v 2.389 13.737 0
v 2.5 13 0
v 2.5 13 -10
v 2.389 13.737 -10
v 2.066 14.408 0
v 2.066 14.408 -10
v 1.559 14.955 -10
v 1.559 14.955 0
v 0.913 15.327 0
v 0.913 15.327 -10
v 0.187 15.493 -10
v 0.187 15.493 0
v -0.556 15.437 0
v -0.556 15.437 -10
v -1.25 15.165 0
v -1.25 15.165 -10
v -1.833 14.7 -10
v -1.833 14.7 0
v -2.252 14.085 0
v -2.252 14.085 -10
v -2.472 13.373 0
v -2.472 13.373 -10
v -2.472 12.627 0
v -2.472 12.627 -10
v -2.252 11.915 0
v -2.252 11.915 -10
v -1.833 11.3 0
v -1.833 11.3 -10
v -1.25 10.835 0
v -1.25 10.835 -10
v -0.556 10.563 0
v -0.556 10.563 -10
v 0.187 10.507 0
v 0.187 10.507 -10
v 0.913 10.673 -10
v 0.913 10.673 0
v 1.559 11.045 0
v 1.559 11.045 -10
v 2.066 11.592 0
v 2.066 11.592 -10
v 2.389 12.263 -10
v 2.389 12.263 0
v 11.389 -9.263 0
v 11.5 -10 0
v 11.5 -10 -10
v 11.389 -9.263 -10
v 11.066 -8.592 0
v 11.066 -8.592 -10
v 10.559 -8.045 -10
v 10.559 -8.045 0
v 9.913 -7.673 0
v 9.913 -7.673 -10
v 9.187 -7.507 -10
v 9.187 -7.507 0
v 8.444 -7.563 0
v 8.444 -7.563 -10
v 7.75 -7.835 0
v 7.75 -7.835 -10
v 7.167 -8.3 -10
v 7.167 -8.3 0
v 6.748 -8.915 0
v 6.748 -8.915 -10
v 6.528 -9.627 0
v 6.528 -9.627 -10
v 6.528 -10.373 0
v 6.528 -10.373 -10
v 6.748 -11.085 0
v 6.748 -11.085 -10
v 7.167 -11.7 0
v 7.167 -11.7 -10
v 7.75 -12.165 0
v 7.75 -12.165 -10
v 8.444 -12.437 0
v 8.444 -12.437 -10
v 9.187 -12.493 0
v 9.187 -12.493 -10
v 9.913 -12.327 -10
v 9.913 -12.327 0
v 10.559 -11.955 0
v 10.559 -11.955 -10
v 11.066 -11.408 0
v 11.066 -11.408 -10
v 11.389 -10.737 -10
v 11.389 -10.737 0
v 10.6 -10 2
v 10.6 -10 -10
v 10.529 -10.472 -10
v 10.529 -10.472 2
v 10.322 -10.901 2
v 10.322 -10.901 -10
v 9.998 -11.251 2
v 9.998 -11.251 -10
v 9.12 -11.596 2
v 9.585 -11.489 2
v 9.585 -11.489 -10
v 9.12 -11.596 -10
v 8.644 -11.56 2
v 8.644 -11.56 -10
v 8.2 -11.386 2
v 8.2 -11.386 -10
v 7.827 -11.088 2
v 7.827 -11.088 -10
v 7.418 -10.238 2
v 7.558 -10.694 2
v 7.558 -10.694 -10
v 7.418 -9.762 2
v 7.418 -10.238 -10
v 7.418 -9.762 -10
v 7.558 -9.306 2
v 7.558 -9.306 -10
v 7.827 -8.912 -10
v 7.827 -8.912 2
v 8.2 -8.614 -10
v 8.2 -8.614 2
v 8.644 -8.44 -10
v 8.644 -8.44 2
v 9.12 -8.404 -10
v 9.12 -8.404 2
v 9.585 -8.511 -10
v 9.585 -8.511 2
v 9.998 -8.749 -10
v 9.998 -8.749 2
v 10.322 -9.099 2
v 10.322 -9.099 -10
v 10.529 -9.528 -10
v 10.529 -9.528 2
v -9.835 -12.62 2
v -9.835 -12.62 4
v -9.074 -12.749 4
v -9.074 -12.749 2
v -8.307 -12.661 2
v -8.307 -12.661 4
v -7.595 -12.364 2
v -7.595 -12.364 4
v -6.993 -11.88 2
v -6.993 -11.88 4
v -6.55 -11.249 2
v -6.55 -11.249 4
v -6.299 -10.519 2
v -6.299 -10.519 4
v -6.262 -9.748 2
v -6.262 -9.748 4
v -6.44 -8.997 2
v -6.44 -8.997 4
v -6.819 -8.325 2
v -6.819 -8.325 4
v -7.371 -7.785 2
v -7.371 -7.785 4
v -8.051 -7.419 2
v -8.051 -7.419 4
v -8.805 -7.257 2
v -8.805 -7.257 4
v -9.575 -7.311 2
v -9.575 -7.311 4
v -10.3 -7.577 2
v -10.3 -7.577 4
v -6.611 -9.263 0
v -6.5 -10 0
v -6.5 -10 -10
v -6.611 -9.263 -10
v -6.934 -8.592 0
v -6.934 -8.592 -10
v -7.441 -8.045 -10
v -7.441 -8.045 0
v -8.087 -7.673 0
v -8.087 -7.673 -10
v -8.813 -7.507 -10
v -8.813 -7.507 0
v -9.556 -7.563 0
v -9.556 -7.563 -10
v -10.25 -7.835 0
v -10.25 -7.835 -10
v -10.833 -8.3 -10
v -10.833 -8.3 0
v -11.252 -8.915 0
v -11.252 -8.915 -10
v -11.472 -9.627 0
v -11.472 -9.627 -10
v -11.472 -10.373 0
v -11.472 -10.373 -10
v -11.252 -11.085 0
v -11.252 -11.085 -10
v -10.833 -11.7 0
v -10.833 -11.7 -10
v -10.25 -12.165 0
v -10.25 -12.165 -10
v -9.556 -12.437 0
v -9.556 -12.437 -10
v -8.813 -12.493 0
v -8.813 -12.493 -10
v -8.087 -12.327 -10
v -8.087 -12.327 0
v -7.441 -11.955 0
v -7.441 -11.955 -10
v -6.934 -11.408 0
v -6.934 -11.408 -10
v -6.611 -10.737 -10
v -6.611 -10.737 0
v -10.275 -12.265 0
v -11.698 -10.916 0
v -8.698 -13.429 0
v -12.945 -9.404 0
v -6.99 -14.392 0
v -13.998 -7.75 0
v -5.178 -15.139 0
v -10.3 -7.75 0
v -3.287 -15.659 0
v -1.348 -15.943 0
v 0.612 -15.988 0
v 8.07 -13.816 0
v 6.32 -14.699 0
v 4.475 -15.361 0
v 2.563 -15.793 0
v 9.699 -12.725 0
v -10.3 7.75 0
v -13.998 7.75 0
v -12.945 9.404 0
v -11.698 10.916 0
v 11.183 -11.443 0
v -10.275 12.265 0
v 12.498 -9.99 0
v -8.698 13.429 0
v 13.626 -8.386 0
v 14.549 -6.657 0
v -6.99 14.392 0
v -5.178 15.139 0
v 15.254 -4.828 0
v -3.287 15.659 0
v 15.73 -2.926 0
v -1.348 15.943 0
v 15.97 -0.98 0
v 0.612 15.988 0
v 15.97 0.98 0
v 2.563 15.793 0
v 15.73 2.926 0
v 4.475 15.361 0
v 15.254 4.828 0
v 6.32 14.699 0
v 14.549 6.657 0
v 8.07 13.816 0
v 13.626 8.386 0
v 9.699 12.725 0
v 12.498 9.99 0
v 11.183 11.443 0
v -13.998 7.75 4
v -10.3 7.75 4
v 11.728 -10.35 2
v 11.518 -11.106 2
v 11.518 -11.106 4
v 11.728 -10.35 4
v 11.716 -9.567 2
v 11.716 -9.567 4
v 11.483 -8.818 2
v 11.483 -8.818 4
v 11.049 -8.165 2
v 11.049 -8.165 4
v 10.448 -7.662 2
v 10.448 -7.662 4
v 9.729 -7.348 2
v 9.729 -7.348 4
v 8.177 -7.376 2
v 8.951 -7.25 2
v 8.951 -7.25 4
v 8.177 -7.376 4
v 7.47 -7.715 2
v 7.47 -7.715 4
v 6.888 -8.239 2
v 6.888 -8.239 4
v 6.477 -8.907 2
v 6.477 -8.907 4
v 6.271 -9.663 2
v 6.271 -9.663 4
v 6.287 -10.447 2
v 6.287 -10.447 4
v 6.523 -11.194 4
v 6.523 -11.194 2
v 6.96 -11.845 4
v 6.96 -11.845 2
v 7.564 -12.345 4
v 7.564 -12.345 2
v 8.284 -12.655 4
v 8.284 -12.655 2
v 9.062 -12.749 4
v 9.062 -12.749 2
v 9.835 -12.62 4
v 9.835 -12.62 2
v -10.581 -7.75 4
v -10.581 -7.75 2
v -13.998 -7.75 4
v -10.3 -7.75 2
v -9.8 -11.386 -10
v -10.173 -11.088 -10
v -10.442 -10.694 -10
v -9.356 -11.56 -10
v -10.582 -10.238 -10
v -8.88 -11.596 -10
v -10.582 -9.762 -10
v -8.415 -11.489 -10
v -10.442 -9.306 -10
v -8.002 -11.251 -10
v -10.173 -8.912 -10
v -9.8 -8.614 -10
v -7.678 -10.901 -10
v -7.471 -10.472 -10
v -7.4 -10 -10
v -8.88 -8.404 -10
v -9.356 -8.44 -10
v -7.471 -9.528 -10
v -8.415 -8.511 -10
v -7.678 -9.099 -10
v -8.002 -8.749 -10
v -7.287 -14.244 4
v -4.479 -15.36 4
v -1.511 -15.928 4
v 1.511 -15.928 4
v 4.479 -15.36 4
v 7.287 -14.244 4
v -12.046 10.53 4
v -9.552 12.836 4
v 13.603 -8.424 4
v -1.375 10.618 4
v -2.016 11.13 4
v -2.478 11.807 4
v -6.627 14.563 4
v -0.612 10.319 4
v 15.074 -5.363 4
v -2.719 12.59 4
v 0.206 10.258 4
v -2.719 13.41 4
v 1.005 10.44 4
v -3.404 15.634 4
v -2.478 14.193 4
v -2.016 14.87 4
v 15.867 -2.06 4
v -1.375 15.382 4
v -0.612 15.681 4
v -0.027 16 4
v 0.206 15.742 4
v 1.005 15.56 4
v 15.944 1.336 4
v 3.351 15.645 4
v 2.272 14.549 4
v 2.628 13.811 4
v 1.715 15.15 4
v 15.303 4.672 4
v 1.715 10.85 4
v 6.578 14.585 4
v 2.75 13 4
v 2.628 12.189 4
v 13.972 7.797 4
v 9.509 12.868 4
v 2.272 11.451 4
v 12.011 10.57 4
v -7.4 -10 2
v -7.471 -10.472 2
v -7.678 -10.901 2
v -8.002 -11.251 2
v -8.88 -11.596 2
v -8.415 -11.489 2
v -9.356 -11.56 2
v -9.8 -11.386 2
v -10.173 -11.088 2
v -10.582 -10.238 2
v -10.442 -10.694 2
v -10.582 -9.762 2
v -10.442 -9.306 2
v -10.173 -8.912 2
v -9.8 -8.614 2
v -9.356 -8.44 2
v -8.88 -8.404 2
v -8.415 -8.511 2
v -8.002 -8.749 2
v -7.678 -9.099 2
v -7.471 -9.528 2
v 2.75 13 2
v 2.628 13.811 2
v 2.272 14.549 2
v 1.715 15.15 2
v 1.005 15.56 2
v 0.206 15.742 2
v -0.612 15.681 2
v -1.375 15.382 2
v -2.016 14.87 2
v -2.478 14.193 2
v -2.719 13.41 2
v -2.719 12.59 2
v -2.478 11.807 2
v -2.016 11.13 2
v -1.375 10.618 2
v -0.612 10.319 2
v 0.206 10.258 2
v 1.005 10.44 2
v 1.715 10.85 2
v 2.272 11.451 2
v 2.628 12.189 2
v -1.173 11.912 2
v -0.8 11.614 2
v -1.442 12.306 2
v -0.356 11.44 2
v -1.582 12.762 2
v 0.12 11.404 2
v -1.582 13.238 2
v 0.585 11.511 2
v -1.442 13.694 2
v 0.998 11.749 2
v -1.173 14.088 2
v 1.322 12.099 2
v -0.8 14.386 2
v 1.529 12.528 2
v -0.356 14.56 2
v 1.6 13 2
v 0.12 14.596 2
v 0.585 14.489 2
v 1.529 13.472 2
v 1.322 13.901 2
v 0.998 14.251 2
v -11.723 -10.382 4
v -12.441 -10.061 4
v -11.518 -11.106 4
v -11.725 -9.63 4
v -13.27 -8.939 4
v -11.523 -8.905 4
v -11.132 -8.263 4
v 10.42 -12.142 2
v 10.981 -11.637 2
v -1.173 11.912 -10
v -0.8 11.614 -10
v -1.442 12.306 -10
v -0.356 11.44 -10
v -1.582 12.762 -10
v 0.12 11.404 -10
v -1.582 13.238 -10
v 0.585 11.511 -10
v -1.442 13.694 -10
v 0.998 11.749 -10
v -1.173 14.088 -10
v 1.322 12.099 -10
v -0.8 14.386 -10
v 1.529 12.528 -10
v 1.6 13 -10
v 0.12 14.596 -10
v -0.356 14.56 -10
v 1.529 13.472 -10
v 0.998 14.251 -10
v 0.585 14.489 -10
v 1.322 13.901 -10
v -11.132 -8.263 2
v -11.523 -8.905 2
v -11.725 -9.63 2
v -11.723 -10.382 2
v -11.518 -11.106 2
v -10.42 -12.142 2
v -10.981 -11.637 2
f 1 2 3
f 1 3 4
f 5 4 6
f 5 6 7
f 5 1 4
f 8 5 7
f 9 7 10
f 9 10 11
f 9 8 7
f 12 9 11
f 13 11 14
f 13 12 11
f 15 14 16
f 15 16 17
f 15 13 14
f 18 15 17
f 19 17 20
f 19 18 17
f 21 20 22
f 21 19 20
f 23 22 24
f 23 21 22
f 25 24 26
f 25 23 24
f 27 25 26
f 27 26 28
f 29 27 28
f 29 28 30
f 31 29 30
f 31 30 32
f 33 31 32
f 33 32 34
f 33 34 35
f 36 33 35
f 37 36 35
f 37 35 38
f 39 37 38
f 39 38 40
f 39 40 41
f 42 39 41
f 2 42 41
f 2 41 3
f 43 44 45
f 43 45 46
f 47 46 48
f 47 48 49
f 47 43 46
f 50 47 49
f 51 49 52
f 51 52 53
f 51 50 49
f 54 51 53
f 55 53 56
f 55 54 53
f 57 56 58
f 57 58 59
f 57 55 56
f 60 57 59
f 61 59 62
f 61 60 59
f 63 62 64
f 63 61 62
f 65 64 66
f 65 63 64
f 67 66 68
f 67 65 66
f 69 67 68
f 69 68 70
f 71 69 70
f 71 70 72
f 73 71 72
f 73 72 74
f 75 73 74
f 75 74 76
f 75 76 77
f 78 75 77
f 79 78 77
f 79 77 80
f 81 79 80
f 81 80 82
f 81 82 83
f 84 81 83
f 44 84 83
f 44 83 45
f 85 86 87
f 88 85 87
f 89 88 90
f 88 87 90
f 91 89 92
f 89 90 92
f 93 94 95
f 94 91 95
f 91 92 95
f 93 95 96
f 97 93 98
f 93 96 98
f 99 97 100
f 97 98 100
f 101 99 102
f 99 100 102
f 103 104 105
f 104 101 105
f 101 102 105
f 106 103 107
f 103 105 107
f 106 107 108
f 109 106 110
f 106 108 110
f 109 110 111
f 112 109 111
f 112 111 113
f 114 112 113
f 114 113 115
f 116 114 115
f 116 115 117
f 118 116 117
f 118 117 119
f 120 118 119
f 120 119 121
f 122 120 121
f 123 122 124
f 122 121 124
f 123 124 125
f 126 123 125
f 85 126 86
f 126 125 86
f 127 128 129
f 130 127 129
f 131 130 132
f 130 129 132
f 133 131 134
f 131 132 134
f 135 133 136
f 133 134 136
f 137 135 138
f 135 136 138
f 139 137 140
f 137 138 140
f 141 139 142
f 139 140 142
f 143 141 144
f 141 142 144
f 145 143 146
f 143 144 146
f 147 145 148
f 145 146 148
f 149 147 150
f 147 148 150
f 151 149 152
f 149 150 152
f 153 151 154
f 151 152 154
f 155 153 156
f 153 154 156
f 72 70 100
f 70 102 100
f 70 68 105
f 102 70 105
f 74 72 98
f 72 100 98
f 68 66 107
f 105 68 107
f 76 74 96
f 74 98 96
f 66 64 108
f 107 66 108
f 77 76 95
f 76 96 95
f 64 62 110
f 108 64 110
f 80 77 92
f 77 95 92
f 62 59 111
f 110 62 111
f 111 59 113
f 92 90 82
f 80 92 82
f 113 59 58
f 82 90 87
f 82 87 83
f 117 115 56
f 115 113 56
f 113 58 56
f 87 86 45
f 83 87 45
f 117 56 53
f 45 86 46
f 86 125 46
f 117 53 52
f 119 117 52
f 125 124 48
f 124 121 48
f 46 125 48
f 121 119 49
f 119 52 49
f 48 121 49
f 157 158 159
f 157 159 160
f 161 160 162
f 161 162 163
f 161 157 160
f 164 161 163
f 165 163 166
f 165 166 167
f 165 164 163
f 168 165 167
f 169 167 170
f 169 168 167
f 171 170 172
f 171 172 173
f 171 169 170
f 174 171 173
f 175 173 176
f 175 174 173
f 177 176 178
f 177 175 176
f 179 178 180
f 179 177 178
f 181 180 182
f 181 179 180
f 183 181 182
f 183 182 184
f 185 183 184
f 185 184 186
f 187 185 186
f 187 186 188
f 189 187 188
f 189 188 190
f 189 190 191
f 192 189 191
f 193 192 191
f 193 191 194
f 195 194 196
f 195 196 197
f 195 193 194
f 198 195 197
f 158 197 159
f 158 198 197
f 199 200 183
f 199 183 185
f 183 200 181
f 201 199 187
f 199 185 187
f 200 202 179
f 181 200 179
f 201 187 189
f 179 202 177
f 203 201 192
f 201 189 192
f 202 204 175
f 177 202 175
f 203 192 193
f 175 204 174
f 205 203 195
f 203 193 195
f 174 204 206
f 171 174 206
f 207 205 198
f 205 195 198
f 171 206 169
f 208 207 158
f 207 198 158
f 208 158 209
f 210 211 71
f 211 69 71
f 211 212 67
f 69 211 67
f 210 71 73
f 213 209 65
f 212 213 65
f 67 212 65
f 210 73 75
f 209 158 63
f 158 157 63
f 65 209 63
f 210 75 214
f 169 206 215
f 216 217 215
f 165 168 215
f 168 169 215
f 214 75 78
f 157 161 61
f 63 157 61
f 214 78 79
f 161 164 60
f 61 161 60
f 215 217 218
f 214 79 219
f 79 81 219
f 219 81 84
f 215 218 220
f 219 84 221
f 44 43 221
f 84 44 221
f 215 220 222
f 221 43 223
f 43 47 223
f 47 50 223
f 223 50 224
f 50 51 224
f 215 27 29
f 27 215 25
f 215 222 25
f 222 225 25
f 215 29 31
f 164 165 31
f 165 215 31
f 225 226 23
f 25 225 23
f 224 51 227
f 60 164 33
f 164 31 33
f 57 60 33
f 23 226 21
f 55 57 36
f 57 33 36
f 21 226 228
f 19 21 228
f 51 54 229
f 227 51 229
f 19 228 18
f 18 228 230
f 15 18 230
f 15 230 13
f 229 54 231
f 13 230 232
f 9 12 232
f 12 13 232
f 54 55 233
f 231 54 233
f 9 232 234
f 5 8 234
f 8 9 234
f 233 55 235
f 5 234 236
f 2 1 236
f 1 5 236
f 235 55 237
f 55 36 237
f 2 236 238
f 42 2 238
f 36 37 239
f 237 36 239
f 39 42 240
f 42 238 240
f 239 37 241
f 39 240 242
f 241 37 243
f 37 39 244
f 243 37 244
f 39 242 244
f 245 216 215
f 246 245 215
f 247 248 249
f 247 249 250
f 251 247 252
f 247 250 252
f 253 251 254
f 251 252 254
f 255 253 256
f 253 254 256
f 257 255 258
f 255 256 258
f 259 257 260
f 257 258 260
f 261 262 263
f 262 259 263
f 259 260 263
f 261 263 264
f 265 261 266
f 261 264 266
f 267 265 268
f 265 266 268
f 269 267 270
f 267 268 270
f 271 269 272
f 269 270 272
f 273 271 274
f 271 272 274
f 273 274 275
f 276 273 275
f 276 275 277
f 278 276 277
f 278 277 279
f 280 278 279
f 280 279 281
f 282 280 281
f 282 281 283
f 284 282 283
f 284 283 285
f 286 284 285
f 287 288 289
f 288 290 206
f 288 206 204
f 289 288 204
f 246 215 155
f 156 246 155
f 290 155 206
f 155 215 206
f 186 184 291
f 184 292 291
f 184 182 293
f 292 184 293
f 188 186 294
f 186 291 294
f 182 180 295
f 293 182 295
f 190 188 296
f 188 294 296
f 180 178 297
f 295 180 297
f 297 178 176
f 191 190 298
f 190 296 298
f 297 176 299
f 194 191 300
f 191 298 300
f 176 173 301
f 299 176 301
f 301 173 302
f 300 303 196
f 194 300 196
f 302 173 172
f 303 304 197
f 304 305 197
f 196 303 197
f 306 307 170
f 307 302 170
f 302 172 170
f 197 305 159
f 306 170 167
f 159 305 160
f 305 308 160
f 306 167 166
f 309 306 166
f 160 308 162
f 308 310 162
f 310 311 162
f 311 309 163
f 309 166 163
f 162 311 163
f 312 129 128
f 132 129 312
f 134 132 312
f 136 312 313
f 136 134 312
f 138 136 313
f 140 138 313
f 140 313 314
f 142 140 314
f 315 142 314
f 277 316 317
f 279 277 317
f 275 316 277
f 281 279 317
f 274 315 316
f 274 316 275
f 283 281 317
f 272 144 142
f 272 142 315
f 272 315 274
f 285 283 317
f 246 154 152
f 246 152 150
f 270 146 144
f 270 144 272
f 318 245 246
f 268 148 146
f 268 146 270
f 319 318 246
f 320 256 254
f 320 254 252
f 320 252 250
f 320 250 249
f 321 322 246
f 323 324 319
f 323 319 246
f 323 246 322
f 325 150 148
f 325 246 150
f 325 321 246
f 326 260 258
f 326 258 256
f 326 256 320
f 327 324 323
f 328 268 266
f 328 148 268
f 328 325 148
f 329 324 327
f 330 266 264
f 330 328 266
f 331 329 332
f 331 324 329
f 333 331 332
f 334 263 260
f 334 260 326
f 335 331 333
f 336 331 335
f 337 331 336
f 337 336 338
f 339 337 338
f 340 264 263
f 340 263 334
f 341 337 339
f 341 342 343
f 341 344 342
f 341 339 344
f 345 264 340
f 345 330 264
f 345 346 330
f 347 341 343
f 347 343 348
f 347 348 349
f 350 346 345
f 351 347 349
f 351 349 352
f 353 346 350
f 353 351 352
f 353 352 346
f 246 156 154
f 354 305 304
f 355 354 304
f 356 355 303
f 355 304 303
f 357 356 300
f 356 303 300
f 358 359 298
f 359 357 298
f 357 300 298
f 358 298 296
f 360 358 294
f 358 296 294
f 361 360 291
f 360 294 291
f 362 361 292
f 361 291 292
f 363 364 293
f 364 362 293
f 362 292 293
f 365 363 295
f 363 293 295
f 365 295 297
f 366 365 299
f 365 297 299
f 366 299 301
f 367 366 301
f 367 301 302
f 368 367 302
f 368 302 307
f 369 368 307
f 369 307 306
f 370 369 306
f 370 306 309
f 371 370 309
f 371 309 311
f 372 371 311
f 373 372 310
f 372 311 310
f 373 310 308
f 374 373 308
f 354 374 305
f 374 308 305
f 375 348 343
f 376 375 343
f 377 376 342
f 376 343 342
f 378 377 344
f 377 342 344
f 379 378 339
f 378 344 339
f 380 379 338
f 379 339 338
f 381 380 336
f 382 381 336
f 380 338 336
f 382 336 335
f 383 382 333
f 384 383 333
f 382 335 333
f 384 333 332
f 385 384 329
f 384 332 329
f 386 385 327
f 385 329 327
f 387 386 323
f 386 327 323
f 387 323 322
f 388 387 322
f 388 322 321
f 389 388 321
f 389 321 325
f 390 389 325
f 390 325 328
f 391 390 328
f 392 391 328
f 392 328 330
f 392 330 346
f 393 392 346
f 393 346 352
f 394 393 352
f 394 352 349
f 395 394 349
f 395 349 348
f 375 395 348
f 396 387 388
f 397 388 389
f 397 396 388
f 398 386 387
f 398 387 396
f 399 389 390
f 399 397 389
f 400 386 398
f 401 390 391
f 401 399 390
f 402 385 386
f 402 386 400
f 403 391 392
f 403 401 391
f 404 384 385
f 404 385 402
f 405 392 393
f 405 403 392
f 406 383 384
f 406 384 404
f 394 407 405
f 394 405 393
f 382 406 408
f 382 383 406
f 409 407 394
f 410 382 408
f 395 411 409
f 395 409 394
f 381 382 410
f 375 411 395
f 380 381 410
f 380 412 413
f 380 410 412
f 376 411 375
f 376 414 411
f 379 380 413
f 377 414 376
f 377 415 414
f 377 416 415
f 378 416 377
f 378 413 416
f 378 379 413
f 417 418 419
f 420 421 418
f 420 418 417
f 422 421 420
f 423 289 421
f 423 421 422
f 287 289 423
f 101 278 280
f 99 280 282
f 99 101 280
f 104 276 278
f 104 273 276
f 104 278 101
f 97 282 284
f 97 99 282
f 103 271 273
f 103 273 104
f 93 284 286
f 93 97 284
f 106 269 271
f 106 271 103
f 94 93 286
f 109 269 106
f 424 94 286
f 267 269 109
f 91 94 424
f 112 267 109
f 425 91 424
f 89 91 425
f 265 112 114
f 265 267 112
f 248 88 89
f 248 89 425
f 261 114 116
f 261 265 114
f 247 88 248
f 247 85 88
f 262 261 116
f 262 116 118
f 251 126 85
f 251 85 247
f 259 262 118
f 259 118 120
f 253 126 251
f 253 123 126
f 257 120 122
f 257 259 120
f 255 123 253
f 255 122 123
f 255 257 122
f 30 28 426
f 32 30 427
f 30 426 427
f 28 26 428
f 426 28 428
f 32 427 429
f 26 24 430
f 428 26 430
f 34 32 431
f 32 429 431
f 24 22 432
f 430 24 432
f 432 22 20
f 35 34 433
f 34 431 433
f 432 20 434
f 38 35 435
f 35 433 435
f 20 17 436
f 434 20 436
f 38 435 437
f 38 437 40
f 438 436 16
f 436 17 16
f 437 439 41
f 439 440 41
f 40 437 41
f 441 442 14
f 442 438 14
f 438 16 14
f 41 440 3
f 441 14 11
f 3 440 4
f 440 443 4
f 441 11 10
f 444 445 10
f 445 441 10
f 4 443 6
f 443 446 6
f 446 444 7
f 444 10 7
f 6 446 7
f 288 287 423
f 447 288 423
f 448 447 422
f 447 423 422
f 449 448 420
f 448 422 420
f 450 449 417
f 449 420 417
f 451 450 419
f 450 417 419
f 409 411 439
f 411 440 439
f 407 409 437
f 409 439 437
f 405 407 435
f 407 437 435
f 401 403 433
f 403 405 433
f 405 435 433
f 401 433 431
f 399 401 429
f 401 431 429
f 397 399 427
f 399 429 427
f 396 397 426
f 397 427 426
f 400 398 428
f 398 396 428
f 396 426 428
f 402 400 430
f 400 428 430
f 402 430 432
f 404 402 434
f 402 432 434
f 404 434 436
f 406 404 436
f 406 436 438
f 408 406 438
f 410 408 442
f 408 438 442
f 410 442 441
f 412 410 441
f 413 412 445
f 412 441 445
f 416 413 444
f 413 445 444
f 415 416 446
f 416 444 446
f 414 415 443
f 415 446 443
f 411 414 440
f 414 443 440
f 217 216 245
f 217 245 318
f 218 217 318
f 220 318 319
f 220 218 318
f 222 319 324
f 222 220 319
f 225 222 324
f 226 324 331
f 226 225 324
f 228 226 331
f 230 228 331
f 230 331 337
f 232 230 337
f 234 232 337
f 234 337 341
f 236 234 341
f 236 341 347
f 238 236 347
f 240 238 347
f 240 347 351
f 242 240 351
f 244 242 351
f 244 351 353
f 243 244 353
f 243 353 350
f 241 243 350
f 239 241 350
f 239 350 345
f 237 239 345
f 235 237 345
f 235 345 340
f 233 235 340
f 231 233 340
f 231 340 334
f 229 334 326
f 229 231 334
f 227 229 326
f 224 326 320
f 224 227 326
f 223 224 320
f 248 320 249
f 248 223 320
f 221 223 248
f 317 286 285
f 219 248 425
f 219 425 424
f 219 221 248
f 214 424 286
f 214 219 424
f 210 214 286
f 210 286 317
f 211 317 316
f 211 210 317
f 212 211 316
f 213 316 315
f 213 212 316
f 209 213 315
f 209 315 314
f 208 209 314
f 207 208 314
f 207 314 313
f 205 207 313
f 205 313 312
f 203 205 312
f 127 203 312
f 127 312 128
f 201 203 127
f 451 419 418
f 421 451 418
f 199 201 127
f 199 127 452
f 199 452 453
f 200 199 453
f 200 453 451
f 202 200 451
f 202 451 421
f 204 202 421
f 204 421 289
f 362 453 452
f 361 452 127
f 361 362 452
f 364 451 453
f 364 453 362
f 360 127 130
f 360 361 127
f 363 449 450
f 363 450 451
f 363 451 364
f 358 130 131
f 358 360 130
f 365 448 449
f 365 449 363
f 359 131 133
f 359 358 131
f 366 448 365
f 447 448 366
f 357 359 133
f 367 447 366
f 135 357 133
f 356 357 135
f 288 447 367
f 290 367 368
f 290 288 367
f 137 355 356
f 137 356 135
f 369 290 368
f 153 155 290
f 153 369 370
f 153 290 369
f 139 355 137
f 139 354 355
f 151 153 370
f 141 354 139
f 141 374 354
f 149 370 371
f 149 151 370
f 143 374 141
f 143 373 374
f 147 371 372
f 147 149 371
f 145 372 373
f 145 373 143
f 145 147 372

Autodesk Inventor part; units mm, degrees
ref_plane "YZ Plane" through (0, 0, 0) normal (1, 0, 0) x (0, 1, 0)
ref_plane "XZ Plane" through (0, 0, 0) normal (0, 1, 0) x (-1, 0, 0)
ref_plane "XY Plane" through (0, 0, 0) normal (0, 0, 1) x (1, 0, 0)
sketch "Sketch1" plane through (0, 0, 0) normal (0, 0, 1) x (1, 0, 0)
  circle A0 centre (0, 0) radius 16
  line L0 (-16, 7.75) -> (-10.3, 7.75)
  line L1 (-10.3, 7.75) -> (-10.3, -7.75)
  line L2 (-10.3, -7.75) -> (-16, -7.75)
  line L3 (-16, -7.75) -> (-16, 7.75)
  circle A1 centre (-9, -10) radius 1.6
  circle A2 centre (9, -10) radius 1.6
  circle A3 centre (0, 13) radius 1.6
  circle A4 centre (0, 13) radius 2.5
  circle A5 centre (-9, -10) radius 2.5
  circle A6 centre (9, -10) radius 2.5
  point P0 (-10.3, 0)
  point P1 (-13.9978, -7.75)
  point P2 (-13.9978, 7.75)
  dimension "d0" = 32
  dimension "d1" = 5.7
  dimension "d2" = 15.5
  dimension "d3" = 9
  dimension "d4" = 9
  dimension "d5" = 23
  dimension "d6" = 13
  dimension "d7" = 3.2
  dimension "d8" = 5
extrude "Extrusion1" add sketch "Sketch1" along normal blind 4 contours A0 L2 L1 L0 | A4 | A5 | A6 picked at (0.1004, -2.0554)
extrude "Extrusion2" add sketch "Sketch1" against normal blind 10 contours A4 | A5 | A6
sketch "Sketch2" plane through (0, 0, 4) normal (0, 0, 1) x (1, 0, 0)
  circle A0 centre (0, 13) radius 1.6 projected
  circle A1 centre (-9, -10) radius 1.6 projected
  circle A2 centre (9, -10) radius 1.6 projected
  circle A3 centre (0, 13) radius 2.75
  circle A4 centre (-9, -10) radius 2.75
  circle A5 centre (9, -10) radius 2.75
  point P0 (0, 0)
  dimension "d14" = 5.5
extrude "Extrusion3" cut sketch "Sketch2" against normal blind 2
equation "\"d4\" = d3"
properties part number "Driveunit_Spacer"
